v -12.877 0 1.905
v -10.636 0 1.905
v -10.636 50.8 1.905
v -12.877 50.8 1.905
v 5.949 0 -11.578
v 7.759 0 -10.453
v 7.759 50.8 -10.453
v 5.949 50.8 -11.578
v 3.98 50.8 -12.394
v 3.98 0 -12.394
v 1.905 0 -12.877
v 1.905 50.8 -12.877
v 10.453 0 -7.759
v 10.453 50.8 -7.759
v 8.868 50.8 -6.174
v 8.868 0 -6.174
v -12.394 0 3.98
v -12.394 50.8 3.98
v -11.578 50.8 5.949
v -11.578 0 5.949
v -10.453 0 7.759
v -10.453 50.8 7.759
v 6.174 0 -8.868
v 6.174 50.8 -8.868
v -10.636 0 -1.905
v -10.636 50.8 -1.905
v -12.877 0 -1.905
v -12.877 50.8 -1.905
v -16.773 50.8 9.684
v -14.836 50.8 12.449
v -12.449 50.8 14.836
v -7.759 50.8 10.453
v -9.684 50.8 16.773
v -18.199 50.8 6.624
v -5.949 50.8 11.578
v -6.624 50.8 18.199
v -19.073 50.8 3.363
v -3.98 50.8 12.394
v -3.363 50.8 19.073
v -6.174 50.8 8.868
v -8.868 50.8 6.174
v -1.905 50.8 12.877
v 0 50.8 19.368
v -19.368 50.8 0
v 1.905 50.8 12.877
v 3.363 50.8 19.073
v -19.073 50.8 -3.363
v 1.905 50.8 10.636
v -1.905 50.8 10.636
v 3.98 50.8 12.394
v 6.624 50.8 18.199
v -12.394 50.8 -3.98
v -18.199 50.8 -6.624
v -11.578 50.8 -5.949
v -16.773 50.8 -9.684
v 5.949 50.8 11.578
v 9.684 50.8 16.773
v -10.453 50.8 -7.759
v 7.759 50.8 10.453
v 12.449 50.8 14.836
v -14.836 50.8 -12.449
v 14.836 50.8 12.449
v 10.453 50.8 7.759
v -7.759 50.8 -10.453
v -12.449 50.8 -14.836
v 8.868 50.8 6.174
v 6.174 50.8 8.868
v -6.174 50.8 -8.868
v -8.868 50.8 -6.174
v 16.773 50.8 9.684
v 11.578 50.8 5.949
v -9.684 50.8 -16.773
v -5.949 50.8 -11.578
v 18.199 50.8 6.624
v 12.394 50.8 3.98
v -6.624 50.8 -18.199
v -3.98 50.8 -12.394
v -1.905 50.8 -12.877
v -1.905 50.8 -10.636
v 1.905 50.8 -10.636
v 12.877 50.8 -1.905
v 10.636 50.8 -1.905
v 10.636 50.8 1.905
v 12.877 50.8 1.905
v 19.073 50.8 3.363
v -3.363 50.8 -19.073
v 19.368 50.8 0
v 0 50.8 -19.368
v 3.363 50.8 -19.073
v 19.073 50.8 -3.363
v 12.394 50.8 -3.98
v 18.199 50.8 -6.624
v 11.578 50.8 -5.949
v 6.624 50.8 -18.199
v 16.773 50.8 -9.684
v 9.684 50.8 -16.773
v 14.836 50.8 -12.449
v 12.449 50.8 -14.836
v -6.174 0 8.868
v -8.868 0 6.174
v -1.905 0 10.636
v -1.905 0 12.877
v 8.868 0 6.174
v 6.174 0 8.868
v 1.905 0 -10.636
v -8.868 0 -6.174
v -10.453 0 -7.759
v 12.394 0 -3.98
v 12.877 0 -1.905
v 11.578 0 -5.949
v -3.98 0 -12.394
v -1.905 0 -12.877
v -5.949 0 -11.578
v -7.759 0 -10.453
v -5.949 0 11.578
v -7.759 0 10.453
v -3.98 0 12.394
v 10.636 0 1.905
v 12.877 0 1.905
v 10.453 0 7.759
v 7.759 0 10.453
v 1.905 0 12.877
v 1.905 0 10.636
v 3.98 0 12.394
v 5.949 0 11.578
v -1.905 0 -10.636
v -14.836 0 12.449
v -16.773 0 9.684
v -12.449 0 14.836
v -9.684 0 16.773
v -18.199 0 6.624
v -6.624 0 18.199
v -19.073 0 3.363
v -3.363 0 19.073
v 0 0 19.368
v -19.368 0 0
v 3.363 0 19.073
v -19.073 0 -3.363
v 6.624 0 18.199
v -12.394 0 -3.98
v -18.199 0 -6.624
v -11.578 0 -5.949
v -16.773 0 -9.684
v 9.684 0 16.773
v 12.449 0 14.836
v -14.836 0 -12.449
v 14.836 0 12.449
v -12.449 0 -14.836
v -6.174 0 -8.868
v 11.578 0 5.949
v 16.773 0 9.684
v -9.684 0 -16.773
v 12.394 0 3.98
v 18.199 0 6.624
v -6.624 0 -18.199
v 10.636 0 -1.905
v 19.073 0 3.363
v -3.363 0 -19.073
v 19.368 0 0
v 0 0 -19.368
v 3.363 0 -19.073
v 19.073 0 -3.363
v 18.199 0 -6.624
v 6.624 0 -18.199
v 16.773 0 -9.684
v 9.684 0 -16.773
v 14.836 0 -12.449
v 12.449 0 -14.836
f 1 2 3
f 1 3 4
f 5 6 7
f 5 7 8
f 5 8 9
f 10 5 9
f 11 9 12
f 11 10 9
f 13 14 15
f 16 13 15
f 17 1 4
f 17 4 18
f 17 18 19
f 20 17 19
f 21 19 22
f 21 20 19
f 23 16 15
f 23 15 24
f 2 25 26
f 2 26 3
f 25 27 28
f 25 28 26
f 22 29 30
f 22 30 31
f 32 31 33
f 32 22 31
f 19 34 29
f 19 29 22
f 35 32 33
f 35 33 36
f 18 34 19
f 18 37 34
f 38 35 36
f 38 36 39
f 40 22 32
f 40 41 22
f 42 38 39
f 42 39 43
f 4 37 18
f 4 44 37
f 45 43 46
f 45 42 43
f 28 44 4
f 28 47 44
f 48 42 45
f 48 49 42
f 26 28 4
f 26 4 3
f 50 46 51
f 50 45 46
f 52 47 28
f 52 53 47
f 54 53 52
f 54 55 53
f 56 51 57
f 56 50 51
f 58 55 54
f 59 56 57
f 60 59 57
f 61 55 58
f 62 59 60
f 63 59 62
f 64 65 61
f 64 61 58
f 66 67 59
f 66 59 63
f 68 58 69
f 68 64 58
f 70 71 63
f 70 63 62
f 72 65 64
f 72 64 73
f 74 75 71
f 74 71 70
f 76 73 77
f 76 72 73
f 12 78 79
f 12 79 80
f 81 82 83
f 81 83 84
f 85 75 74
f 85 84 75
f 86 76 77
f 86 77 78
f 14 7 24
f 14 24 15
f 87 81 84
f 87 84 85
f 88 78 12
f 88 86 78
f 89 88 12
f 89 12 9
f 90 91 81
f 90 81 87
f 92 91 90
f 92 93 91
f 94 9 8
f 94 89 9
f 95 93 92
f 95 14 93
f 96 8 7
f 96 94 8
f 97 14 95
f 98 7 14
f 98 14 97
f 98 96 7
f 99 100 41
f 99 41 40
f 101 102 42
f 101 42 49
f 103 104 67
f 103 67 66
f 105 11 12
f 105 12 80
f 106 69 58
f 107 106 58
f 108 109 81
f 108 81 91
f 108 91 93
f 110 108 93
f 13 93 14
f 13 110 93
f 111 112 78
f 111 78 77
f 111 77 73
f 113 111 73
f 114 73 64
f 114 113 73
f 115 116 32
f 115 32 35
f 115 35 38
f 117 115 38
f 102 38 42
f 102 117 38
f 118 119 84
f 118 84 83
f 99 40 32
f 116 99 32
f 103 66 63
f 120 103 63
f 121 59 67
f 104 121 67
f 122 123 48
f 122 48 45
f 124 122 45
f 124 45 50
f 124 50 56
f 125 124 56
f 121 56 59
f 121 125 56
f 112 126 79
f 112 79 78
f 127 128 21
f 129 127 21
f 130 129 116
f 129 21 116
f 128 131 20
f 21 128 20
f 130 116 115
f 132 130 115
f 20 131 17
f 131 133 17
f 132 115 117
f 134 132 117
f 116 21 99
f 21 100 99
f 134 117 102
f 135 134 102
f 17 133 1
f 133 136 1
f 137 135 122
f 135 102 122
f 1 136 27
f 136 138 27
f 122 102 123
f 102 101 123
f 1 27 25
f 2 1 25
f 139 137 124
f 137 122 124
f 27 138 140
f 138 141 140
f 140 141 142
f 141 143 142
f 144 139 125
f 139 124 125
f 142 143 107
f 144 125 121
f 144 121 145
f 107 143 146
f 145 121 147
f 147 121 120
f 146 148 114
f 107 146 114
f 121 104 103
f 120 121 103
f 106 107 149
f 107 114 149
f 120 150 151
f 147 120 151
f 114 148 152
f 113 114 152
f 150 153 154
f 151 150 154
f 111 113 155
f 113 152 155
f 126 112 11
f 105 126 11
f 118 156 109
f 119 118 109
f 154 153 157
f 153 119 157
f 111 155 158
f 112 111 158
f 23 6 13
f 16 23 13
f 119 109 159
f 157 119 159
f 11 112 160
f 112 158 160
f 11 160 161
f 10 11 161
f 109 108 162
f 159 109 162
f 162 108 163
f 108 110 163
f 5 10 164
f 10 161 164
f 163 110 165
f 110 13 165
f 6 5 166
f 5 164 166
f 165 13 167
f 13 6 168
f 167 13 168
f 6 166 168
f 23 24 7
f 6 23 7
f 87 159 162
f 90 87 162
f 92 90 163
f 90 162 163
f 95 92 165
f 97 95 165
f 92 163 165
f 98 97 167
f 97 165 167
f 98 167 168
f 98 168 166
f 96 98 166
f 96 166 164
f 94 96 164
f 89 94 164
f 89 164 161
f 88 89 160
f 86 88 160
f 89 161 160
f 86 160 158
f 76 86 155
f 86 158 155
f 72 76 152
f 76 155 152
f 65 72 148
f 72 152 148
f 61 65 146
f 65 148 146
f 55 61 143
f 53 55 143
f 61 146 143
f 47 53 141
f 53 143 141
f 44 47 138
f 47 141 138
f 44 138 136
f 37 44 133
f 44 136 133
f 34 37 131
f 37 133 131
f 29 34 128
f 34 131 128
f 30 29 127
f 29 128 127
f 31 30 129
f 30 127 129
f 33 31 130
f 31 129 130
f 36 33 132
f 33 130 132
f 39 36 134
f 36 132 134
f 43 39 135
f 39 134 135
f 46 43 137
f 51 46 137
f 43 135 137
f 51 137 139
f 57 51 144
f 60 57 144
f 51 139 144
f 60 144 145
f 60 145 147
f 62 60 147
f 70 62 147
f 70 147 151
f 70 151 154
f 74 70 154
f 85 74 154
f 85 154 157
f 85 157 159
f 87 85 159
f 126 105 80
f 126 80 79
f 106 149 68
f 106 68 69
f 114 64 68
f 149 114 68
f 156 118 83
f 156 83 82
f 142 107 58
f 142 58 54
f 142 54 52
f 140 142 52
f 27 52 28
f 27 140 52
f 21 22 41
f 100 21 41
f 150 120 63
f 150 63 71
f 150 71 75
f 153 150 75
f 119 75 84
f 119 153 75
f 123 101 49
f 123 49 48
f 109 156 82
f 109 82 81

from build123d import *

# Parameters (mm, degrees)
SKETCH3_R           = 19.3675
BOSS_EXTRUDE2_DEPTH = 50.8


with BuildPart() as part:
    # Sketch3 → Boss-Extrude2 (new body)
    with BuildSketch(Plane(origin=(0, 0, 0), x_dir=(1, 0, 0), z_dir=(0, 1, 0))):
        Circle(SKETCH3_R)
        with BuildLine():
            Line((1.905, 12.877355367), (1.905, 10.63625))
            Line((1.905, 10.63625), (-1.905, 10.63625))
            Line((-1.905, 10.63625), (-1.905, 12.877355367))
            ThreePointArc((-1.905, 12.877355367), (-4.981581581, 12.026601814), (-7.758626886, 10.452703722))
            Line((-7.758626886, 10.452703722), (-6.173926083, 8.86800292))
            Line((-6.173926083, 8.86800292), (-8.86800292, 6.173926083))
            Line((-8.86800292, 6.173926083), (-10.452703722, 7.758626886))
            ThreePointArc((-10.452703722, 7.758626886), (-12.026601814, 4.981581581), (-12.877355367, 1.905))
            Line((-12.877355367, 1.905), (-10.63625, 1.905))
            Line((-10.63625, 1.905), (-10.63625, -1.905))
            Line((-10.63625, -1.905), (-12.877355367, -1.905))
            ThreePointArc((-12.877355367, -1.905), (-12.026601814, -4.981581581), (-10.452703722, -7.758626886))
            Line((-10.452703722, -7.758626886), (-8.86800292, -6.173926083))
            Line((-8.86800292, -6.173926083), (-6.173926083, -8.86800292))
            Line((-6.173926083, -8.86800292), (-7.758626886, -10.452703722))
            ThreePointArc((-7.758626886, -10.452703722), (-4.981581581, -12.026601814), (-1.905, -12.877355367))
            Line((-1.905, -12.877355367), (-1.905, -10.63625))
            Line((-1.905, -10.63625), (1.905, -10.63625))
            Line((1.905, -10.63625), (1.905, -12.877355367))
            ThreePointArc((1.905, -12.877355367), (4.981581581, -12.026601814), (7.758626886, -10.452703722))
            Line((7.758626886, -10.452703722), (6.173926083, -8.86800292))
            Line((6.173926083, -8.86800292), (8.86800292, -6.173926083))
            Line((8.86800292, -6.173926083), (10.452703722, -7.758626886))
            ThreePointArc((10.452703722, -7.758626886), (12.026601814, -4.981581581), (12.877355367, -1.905))
            Line((12.877355367, -1.905), (10.63625, -1.905))
            Line((10.63625, -1.905), (10.63625, 1.905))
            Line((10.63625, 1.905), (12.877355367, 1.905))
            ThreePointArc((12.877355367, 1.905), (12.026601814, 4.981581581), (10.452703722, 7.758626886))
            Line((10.452703722, 7.758626886), (8.86800292, 6.173926083))
            Line((8.86800292, 6.173926083), (6.173926083, 8.86800292))
            Line((6.173926083, 8.86800292), (7.758626886, 10.452703722))
            ThreePointArc((7.758626886, 10.452703722), (4.981581581, 12.026601814), (1.905, 12.877355367))
        make_face(mode=Mode.SUBTRACT)
    extrude(amount=BOSS_EXTRUDE2_DEPTH)


solid = part.part
